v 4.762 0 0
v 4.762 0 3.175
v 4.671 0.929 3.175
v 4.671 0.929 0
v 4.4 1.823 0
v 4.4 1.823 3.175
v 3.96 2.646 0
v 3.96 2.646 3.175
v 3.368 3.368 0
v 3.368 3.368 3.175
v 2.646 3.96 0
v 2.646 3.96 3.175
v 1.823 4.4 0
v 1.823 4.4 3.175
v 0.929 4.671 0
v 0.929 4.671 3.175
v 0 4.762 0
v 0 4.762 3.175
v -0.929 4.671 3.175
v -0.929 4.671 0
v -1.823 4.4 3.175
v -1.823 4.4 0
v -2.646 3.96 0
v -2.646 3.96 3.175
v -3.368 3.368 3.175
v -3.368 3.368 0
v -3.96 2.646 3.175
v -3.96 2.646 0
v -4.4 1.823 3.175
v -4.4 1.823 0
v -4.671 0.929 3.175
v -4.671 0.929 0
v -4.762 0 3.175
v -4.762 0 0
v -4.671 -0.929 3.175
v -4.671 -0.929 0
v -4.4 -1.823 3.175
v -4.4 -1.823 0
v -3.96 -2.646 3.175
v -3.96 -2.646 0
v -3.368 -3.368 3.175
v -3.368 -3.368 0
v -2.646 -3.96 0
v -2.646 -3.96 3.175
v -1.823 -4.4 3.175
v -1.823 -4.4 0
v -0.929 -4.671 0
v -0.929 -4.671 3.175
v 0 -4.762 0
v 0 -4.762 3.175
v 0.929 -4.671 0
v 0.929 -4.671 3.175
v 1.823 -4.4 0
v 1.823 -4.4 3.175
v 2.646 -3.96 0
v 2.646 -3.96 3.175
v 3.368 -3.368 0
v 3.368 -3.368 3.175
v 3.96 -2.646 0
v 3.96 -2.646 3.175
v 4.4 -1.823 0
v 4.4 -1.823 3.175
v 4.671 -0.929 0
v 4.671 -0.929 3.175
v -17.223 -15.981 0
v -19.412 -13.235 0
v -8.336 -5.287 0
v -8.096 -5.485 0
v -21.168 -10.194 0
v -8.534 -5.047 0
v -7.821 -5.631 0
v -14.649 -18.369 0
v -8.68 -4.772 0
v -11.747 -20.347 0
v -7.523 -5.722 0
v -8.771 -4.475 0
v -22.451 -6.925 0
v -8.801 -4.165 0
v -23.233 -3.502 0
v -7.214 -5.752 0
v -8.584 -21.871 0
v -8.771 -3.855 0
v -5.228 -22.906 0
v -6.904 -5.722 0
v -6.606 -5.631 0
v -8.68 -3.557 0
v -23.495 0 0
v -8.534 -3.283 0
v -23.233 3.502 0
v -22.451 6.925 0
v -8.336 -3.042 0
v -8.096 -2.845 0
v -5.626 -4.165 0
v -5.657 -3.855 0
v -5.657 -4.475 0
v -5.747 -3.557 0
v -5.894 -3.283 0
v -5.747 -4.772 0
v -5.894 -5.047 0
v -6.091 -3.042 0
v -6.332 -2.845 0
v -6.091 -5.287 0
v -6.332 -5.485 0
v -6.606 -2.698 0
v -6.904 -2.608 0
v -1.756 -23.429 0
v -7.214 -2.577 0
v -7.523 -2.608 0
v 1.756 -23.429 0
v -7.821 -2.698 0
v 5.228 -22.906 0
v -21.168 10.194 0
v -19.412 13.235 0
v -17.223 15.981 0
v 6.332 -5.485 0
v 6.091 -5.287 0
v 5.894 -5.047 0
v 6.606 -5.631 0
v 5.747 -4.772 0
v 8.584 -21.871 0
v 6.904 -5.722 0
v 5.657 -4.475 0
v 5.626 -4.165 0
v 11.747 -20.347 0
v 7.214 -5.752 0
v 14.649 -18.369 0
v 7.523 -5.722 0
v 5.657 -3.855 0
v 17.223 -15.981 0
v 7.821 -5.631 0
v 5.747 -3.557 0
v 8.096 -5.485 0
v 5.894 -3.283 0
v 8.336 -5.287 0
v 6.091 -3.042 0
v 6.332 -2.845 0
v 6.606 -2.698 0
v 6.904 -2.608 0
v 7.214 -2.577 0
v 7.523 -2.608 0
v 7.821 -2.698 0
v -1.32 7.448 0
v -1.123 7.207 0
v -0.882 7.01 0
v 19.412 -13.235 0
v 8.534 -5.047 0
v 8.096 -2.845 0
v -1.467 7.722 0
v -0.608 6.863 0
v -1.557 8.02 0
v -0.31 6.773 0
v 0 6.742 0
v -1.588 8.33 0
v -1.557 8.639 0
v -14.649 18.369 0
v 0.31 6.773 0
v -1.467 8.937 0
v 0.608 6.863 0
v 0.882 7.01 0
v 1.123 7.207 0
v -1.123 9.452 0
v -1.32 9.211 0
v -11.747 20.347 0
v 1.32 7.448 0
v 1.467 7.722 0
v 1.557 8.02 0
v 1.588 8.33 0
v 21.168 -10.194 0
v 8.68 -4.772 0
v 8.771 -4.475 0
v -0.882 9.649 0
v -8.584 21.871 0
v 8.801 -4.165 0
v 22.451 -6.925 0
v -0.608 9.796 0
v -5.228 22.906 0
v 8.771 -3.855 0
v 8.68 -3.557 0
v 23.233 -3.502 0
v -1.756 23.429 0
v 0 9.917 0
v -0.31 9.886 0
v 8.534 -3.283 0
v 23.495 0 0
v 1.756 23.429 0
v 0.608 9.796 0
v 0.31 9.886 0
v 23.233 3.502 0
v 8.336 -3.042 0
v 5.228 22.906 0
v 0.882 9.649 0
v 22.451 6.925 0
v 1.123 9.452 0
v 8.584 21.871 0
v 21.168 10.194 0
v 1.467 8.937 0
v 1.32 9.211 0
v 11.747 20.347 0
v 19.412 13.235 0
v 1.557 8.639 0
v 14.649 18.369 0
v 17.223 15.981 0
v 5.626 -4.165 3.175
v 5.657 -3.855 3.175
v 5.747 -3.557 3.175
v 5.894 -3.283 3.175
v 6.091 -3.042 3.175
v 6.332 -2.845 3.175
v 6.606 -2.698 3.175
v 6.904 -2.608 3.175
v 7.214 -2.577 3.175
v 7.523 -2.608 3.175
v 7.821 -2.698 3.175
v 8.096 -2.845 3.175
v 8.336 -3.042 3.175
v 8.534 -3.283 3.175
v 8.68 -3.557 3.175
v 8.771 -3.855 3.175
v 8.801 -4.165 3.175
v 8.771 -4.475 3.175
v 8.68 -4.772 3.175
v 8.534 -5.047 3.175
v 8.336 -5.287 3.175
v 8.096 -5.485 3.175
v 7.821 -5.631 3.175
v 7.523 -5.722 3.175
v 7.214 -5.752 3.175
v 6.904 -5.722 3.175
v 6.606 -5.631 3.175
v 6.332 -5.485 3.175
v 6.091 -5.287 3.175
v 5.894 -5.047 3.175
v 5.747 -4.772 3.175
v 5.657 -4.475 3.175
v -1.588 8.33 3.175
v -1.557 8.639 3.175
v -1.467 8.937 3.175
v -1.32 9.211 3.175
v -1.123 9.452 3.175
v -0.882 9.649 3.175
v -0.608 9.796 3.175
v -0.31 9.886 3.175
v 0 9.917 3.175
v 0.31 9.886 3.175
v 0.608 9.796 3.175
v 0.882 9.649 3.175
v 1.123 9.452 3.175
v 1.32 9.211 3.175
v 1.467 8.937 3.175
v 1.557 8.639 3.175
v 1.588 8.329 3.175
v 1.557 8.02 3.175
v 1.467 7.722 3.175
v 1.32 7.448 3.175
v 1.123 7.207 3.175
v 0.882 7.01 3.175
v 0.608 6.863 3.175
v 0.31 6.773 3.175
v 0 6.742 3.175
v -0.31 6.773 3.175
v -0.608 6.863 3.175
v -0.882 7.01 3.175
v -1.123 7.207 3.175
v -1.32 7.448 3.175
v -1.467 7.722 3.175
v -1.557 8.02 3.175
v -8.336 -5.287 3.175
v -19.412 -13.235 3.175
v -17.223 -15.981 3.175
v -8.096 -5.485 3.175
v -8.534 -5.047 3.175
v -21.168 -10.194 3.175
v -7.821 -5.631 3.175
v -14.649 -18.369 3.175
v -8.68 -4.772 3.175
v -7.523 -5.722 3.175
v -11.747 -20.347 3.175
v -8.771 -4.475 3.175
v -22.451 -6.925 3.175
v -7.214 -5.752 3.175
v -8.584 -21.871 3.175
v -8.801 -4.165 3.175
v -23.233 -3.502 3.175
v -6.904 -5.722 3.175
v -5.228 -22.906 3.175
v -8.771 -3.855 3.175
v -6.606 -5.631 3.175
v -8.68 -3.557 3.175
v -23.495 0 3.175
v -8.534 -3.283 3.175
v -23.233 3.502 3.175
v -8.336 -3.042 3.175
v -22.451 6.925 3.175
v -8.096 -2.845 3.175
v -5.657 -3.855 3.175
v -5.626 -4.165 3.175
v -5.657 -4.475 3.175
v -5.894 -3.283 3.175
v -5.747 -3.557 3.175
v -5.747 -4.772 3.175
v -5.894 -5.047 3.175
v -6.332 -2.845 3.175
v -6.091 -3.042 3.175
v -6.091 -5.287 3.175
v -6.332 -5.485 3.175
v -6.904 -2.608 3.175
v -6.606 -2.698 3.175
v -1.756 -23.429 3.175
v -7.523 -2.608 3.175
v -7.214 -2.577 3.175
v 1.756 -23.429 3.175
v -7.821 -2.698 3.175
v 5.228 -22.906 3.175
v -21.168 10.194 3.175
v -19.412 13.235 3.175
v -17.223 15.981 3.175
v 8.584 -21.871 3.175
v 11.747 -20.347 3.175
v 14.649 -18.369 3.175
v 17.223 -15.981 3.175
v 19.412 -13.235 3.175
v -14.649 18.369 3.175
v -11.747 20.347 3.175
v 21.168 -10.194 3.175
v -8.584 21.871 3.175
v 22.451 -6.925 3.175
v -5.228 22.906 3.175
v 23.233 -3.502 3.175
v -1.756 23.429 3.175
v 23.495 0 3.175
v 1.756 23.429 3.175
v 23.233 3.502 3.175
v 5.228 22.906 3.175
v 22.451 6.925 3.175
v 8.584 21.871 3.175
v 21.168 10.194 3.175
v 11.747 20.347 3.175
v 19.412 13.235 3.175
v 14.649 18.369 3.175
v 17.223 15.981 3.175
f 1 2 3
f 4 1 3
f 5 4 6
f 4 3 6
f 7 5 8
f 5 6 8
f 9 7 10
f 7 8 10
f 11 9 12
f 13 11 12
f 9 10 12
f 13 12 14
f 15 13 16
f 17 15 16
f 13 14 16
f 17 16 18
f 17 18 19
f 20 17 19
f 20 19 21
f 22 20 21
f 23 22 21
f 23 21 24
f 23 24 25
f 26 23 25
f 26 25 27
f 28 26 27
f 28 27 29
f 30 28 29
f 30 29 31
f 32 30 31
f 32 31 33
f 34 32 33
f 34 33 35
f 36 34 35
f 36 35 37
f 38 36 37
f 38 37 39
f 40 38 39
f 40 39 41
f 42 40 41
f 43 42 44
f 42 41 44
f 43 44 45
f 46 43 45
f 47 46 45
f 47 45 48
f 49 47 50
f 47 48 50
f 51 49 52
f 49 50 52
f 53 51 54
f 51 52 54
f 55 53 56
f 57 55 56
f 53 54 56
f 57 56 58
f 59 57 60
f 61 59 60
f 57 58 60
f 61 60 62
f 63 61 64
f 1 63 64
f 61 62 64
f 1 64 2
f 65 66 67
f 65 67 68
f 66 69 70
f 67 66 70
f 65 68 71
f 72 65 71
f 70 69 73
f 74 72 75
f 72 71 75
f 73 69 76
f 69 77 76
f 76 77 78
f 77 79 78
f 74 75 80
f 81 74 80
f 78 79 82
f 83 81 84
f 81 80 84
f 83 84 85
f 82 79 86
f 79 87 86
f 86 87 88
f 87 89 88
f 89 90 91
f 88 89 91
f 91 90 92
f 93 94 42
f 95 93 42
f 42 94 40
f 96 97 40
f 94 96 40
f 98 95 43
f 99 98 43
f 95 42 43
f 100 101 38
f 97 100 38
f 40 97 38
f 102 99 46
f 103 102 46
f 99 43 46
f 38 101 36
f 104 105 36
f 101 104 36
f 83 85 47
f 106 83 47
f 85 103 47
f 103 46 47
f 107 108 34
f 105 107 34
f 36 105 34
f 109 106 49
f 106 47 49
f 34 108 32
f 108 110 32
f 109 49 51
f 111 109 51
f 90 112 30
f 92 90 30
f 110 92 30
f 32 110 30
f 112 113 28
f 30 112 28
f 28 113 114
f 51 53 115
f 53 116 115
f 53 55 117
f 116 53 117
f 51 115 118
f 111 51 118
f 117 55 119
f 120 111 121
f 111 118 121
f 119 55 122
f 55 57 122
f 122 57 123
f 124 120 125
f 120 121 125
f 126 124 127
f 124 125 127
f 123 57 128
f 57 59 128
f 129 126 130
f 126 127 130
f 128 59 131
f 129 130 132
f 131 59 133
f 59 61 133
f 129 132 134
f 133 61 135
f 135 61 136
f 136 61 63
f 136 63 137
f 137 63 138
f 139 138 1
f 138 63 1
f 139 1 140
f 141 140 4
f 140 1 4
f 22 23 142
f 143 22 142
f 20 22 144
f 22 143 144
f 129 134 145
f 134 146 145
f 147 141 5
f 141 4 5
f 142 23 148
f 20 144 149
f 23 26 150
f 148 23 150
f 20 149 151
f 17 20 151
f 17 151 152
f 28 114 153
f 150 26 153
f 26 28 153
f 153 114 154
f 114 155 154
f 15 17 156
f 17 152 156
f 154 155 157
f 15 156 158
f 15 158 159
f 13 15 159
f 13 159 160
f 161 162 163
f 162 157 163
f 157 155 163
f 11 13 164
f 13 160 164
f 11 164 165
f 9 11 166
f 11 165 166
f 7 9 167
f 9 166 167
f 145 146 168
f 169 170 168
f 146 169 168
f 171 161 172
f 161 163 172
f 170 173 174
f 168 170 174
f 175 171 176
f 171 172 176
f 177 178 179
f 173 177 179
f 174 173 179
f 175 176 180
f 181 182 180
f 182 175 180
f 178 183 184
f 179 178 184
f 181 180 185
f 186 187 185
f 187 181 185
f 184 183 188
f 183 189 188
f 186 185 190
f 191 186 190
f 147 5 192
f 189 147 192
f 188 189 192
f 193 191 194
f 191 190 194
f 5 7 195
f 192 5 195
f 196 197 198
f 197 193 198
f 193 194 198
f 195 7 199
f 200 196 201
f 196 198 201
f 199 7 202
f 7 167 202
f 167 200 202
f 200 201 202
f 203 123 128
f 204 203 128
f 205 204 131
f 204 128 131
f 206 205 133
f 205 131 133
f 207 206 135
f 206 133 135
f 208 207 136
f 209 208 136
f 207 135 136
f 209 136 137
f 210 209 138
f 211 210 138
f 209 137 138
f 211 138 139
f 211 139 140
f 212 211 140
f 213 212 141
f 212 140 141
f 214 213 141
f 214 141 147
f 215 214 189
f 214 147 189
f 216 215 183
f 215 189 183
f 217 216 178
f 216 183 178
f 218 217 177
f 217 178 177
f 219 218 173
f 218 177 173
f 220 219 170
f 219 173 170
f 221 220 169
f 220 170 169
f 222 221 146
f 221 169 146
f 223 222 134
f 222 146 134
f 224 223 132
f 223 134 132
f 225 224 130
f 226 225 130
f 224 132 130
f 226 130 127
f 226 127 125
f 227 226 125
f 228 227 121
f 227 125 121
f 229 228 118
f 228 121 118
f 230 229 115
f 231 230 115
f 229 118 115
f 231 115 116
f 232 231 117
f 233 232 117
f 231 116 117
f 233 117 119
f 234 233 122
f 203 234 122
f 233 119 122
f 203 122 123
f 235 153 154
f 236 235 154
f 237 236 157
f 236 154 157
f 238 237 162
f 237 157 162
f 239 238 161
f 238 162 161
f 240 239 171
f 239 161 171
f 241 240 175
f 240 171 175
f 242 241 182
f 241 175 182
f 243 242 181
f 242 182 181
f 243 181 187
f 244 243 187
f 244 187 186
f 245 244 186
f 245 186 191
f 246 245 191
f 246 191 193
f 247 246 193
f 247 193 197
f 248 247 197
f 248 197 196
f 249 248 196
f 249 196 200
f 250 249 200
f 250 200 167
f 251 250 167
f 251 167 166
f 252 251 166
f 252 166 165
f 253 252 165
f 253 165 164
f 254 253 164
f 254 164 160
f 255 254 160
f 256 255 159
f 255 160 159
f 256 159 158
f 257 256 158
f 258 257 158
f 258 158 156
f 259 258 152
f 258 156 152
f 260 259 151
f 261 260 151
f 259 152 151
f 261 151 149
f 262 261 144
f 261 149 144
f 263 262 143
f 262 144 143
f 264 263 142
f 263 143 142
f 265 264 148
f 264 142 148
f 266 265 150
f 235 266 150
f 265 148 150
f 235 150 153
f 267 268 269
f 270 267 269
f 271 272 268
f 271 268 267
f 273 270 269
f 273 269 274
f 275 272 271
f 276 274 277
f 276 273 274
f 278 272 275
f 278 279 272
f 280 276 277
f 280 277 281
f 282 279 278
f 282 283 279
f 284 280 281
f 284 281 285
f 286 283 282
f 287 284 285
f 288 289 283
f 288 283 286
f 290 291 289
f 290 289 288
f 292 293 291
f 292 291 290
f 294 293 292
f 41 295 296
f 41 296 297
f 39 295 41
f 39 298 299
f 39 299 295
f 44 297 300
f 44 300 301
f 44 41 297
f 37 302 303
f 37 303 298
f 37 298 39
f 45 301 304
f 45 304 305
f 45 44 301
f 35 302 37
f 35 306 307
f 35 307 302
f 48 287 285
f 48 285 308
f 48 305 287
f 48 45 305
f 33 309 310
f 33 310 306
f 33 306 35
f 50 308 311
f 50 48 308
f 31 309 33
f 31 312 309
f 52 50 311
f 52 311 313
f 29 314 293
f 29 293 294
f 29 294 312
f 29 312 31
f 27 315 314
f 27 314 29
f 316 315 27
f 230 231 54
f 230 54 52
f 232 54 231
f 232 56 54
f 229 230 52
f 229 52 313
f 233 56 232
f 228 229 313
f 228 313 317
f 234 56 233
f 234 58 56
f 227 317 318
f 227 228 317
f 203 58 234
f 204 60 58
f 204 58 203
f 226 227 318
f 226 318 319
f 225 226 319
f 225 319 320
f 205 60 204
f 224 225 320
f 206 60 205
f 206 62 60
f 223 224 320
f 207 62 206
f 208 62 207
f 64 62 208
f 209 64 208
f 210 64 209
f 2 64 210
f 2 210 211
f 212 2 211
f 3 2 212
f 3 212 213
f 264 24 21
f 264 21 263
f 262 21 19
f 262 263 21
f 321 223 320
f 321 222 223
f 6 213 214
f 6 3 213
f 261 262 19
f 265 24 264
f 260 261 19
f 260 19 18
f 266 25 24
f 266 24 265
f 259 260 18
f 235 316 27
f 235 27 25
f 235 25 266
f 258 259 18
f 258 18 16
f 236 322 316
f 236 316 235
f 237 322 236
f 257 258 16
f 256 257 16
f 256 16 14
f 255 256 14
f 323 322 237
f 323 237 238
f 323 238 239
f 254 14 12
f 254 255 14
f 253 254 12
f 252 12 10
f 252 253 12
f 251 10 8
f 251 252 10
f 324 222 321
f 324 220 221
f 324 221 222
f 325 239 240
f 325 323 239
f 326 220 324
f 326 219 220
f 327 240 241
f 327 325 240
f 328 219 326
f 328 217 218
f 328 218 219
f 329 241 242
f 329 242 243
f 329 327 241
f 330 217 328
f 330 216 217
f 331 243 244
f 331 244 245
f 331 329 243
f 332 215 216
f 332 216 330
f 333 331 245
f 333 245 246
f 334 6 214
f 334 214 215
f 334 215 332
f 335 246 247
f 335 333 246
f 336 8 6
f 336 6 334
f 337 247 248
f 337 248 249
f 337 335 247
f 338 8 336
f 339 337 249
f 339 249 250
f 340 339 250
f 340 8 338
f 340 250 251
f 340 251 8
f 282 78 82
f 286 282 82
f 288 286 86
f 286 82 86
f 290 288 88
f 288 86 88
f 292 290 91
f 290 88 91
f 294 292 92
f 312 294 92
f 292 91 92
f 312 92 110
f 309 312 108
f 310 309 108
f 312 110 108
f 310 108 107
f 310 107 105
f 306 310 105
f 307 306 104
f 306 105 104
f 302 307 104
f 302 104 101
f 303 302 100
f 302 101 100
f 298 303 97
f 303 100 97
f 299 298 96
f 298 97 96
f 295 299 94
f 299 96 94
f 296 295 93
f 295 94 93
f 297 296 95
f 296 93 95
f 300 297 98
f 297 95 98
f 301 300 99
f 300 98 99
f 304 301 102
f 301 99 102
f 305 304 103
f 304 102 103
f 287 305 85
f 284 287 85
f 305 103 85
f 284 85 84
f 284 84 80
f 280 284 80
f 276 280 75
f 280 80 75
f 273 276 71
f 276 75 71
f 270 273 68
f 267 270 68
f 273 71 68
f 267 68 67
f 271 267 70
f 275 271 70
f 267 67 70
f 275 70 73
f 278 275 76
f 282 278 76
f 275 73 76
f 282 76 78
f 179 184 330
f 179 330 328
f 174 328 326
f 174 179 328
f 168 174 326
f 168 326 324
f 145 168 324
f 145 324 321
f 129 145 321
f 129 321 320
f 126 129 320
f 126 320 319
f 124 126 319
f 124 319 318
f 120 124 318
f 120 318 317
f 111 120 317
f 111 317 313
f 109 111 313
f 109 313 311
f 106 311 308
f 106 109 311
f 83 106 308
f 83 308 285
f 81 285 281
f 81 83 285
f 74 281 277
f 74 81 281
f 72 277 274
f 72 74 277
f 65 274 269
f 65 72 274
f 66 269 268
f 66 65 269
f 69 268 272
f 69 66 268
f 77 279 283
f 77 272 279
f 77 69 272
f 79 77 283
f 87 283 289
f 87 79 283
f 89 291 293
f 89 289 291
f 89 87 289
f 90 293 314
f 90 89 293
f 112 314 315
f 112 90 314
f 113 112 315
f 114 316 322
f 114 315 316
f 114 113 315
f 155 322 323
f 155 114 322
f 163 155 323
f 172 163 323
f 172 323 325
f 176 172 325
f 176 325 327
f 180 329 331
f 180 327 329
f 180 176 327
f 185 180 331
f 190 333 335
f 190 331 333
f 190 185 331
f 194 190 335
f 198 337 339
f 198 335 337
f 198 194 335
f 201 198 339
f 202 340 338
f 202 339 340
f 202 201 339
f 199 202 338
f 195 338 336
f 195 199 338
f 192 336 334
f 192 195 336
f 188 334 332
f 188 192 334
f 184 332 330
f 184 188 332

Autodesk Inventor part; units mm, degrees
ref_plane "YZ Plane" through (0, 0, 0) normal (1, 0, 0) x (0, 1, 0)
ref_plane "XZ Plane" through (0, 0, 0) normal (0, 1, 0) x (-1, 0, 0)
ref_plane "XY Plane" through (0, 0, 0) normal (0, 0, 1) x (1, 0, 0)
sketch "Sketch1" plane through (0, 0, 0) normal (0, 0, 1) x (1, 0, 0)
  circle A0 centre (0, 0) radius 23.495
  dimension "d0" = 46.99
extrude "Extrusion1" add sketch "Sketch1" along normal blind 3.175
sketch "Sketch2" plane through (0, 0, 0) normal (0, 0, -1) x (-1, 0, 0)
  line L0 (0, 0) -> (0, 8.3295)
  circle A0 centre (0, 8.3295) radius 1.5875
  circle A1 centre (-7.2136, -4.1648) radius 1.5875
  circle A2 centre (7.2136, -4.1648) radius 1.5875
  dimension "d3" = 3.175
  dimension "d6" = 360
  dimension "d8" = 14.4272
extrude "Extrusion2" cut sketch "Sketch2" against normal blind 3.175
sketch "Sketch3" plane through (0, 0, 3.175) normal (0, 0, 1) x (1, 0, 0)
  circle A0 centre (0, 0) radius 4.7625
  dimension "d11" = 9.525
extrude "Extrusion3" cut sketch "Sketch3" against normal blind 3.175
properties part number "pistonSpurGear" material "ABS Plastic"
